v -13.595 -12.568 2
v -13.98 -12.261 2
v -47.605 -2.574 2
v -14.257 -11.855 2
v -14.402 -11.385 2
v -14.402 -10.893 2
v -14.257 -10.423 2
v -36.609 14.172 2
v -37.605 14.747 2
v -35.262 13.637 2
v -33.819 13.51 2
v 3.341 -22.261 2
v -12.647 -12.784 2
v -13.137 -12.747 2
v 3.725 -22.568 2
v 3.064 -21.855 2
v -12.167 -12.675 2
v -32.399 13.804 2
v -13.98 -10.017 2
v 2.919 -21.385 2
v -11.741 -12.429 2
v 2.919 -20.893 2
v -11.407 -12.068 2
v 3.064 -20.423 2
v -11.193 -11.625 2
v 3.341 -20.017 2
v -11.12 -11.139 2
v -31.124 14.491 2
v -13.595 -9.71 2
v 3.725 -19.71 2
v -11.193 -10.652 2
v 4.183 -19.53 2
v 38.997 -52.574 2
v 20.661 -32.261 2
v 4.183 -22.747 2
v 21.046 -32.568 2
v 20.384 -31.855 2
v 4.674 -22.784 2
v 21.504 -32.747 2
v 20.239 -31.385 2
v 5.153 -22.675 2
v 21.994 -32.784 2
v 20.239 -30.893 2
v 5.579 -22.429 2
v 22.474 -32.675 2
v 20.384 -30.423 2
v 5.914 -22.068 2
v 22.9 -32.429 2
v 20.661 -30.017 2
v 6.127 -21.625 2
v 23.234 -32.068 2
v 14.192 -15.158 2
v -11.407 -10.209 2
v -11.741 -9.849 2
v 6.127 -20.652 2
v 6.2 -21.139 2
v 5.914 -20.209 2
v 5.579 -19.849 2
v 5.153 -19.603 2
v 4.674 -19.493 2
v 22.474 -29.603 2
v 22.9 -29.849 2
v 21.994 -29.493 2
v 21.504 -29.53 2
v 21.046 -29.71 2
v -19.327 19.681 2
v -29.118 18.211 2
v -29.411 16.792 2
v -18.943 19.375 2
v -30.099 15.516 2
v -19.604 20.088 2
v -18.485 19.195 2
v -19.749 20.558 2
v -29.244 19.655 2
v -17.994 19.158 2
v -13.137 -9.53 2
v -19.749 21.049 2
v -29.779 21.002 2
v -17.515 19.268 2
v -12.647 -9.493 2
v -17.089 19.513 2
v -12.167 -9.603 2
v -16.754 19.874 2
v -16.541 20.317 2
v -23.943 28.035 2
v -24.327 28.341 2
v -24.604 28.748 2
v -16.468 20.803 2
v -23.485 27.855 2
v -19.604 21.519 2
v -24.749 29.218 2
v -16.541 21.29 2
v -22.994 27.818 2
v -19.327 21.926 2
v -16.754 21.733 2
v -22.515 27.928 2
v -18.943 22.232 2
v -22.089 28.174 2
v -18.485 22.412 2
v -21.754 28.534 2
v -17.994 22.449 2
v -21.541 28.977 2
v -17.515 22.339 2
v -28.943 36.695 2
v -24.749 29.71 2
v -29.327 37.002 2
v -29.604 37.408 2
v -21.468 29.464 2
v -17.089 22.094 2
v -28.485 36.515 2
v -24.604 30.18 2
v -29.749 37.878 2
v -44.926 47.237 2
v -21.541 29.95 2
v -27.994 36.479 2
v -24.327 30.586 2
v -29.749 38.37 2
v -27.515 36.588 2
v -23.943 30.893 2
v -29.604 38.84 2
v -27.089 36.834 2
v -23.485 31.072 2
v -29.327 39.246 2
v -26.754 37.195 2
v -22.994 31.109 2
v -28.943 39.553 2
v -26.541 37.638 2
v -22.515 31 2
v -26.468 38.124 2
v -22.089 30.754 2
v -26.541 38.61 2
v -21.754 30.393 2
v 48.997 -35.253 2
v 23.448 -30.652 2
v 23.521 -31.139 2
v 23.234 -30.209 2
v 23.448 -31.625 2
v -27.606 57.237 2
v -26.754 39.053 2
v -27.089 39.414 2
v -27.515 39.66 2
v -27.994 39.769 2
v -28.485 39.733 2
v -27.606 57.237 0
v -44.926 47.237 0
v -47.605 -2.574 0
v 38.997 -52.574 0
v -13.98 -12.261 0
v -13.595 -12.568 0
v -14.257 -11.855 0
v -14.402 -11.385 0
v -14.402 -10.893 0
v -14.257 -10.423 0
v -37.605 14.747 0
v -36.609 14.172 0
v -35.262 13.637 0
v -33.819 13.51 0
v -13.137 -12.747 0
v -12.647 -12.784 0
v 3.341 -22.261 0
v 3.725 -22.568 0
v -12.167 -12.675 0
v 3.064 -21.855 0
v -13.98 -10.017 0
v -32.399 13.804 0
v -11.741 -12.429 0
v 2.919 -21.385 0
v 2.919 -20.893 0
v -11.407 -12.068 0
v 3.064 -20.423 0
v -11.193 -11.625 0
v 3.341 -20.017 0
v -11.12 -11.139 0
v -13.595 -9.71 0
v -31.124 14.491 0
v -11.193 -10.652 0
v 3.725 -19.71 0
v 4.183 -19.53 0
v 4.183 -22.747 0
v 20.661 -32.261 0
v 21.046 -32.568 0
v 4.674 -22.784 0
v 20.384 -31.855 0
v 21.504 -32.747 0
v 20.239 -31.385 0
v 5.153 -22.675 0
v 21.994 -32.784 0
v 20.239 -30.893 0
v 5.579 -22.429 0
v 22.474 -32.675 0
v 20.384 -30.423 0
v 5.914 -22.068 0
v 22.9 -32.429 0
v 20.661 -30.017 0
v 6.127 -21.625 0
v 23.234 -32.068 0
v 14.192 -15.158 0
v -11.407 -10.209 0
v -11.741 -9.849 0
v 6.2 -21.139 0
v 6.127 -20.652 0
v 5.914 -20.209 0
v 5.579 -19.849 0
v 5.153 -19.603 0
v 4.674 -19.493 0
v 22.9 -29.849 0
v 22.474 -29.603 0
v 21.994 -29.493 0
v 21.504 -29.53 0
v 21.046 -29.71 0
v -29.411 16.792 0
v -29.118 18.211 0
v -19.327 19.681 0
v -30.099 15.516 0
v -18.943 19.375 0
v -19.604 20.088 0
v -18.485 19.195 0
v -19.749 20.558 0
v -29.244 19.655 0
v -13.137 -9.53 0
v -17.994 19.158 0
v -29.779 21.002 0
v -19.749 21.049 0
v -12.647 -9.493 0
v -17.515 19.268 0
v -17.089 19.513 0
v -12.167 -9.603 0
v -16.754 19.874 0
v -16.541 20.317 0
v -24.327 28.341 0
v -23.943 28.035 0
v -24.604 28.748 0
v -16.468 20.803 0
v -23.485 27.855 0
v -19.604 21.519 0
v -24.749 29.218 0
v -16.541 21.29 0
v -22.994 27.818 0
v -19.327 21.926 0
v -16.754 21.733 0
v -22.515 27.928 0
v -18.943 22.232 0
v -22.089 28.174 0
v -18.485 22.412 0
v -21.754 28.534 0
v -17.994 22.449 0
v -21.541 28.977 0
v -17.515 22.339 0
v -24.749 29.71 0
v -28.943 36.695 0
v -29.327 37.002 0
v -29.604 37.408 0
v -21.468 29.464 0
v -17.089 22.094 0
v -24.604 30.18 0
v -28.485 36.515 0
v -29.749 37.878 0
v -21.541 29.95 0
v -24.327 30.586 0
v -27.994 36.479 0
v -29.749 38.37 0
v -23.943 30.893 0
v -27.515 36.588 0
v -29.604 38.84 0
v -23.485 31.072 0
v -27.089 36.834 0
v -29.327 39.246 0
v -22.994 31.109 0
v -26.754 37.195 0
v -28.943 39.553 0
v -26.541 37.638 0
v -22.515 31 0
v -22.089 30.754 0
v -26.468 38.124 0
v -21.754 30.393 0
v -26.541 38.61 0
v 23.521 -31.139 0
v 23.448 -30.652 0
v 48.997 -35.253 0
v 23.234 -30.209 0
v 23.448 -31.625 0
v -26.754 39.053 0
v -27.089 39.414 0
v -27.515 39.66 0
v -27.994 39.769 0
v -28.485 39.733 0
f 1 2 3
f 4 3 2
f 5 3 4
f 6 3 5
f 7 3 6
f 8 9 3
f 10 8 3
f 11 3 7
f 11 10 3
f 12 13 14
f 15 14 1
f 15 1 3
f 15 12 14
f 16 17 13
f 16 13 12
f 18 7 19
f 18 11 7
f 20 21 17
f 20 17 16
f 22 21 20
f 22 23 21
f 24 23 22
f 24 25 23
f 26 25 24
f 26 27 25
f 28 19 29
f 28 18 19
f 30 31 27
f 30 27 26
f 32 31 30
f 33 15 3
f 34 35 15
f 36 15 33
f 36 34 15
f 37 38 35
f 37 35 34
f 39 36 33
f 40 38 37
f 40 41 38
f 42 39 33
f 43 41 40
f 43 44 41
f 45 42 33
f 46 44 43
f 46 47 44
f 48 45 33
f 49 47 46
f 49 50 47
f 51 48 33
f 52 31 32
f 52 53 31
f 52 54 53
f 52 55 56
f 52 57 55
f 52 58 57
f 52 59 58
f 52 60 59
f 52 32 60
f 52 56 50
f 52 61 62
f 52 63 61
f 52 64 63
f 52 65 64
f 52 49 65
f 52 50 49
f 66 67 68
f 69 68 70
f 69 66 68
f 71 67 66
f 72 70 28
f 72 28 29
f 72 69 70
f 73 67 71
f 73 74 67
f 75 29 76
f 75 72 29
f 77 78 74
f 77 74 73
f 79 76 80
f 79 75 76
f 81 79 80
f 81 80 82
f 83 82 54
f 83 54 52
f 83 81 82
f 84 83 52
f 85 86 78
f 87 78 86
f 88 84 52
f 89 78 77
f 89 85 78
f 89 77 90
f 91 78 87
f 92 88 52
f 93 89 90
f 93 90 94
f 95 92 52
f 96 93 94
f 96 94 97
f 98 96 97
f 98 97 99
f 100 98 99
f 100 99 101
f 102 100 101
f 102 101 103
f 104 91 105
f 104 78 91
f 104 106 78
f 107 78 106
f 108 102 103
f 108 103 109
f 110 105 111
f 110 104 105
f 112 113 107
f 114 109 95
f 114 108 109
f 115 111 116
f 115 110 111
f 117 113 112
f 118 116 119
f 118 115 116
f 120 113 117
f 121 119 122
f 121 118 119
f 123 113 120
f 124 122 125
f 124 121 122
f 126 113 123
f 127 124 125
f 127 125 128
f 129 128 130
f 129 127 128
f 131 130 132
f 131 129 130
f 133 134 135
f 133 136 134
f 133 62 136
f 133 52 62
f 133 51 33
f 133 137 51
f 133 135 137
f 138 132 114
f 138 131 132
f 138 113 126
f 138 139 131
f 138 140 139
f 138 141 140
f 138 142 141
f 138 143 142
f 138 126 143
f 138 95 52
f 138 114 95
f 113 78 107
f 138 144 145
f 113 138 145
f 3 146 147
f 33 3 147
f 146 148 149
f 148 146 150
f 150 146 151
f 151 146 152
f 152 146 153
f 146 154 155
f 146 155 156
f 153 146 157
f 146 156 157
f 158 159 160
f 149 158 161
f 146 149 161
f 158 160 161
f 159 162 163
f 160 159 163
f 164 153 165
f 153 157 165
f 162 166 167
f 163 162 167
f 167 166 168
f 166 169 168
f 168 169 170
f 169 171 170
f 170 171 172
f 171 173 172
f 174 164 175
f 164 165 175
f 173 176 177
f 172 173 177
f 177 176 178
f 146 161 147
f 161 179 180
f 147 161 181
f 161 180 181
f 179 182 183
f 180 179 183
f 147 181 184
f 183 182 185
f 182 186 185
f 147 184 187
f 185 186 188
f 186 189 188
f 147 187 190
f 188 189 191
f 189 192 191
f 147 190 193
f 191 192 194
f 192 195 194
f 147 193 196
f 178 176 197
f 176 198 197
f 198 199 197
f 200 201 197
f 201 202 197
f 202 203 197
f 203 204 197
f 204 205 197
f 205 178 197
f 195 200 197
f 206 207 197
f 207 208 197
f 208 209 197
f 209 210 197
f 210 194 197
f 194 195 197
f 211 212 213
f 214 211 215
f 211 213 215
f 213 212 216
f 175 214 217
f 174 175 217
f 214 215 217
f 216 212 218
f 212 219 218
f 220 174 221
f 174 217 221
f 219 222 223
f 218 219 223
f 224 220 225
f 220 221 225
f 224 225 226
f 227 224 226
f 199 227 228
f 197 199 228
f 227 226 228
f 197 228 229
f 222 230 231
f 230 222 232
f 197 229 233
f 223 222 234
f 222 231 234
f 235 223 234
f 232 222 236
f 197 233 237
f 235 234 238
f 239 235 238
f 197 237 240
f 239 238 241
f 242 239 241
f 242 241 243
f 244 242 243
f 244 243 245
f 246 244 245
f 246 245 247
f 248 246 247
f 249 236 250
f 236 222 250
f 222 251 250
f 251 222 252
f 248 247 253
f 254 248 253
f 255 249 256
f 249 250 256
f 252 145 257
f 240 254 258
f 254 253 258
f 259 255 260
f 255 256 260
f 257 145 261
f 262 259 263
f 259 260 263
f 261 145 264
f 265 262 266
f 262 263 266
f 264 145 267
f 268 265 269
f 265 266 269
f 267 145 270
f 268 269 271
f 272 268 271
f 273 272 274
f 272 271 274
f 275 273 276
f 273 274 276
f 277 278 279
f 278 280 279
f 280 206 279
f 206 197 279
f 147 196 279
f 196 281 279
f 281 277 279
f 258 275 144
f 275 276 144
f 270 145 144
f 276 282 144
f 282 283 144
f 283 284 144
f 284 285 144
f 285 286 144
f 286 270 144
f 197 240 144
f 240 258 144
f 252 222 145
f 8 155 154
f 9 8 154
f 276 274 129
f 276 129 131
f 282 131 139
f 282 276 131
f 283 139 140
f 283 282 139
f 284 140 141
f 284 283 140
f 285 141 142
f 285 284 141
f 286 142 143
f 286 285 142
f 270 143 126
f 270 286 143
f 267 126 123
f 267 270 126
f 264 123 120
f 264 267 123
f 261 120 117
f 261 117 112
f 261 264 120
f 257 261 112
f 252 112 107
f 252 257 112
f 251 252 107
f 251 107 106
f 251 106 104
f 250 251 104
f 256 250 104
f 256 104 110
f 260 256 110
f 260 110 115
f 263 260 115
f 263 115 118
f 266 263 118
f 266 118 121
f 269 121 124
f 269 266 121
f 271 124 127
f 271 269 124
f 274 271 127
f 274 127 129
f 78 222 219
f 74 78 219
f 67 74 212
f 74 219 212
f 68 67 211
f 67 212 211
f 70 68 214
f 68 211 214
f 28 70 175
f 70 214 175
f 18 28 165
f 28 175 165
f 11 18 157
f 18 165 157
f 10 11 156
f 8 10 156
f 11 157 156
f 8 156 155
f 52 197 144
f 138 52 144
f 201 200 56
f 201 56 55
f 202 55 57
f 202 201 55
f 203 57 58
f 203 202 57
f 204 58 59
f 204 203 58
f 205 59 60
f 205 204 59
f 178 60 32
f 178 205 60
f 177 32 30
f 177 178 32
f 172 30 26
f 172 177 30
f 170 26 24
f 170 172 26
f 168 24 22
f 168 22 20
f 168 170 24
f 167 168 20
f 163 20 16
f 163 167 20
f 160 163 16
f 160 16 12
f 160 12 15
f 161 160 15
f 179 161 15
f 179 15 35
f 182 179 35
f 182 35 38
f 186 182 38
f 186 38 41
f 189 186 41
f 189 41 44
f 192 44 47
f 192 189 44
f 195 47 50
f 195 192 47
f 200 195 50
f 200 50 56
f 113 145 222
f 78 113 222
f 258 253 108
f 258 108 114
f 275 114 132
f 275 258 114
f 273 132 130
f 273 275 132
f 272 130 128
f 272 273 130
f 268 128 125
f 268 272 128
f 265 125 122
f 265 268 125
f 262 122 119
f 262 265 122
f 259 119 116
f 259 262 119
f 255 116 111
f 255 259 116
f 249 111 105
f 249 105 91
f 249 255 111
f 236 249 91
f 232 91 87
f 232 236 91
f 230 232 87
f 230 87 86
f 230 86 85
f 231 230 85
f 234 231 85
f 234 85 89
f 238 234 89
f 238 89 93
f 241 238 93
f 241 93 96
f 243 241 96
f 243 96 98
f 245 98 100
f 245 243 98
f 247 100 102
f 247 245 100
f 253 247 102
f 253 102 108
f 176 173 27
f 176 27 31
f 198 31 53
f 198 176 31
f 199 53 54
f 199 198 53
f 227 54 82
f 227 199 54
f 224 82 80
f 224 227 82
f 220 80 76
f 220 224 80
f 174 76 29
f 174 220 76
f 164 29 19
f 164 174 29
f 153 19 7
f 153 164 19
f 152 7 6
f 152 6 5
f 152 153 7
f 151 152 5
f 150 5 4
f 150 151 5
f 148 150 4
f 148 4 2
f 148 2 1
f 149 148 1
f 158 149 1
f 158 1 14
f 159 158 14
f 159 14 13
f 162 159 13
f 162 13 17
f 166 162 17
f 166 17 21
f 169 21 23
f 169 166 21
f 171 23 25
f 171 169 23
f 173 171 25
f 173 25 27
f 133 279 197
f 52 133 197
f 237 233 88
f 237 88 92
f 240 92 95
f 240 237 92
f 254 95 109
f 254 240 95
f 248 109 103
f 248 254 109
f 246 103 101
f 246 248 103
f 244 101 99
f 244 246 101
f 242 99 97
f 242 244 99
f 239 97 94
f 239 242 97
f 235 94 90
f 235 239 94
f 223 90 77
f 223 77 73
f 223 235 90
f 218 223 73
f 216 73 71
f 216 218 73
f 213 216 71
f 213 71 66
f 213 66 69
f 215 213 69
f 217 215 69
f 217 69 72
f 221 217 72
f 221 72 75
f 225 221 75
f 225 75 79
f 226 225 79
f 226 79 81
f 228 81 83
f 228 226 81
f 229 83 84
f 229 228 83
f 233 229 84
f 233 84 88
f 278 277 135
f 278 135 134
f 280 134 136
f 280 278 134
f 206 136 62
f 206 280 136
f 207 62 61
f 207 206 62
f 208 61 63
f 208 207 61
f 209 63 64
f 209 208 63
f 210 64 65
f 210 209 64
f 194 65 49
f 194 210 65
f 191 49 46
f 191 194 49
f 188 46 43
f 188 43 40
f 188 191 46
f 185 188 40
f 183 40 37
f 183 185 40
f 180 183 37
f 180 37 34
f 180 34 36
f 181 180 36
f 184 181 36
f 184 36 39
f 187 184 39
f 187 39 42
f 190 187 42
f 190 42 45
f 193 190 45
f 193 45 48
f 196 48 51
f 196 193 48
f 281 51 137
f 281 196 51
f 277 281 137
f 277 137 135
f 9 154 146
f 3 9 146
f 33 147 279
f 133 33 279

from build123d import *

# Parameters (mm, degrees)
SKETCH_1_R      = 1.65
EXTRUDE_1_DEPTH = 2


with BuildPart() as part:
    # 草图1 → 凸台-拉伸1 (new body)
    with BuildSketch(Plane.XY):
        with BuildLine():
            Line((-37.605189444, 14.746778458), (-47.605189444, -2.573729618))
            Line((-47.605189444, -2.573729618), (38.997350935, -52.573729618))
            Line((38.997350935, -52.573729618), (48.997350935, -35.253221542))
            Line((48.997350935, -35.253221542), (14.191892619, -15.158280815))
            Line((14.191892619, -15.158280815), (-27.605658614, 57.237201553))
            Line((-27.605658614, 57.237201553), (-44.926166689, 47.237201553))
            Line((-44.926166689, 47.237201553), (-29.779250551, 21.001973223))
            ThreePointArc((-29.779250551, 21.001973223), (-30.573843664, 14.966439317), (-36.60937757, 14.171846204))
            Line((-36.60937757, 14.171846204), (-37.605189444, 14.746778458))
        make_face()
        with Locations((21.870944537, -31.13878889)):
            Circle(SKETCH_1_R, mode=Mode.SUBTRACT)
        with Locations((4.550436462, -21.13878889)):
            Circle(SKETCH_1_R, mode=Mode.SUBTRACT)
        with Locations((-12.770071614, -11.13878889)):
            Circle(SKETCH_1_R, mode=Mode.SUBTRACT)
        with Locations((-18.117652306, 20.803492565)):
            Circle(SKETCH_1_R, mode=Mode.SUBTRACT)
        with Locations((-23.117652306, 29.463746603)):
            Circle(SKETCH_1_R, mode=Mode.SUBTRACT)
        with Locations((-28.117652306, 38.124000641)):
            Circle(SKETCH_1_R, mode=Mode.SUBTRACT)
    extrude(amount=EXTRUDE_1_DEPTH)


solid = part.part
